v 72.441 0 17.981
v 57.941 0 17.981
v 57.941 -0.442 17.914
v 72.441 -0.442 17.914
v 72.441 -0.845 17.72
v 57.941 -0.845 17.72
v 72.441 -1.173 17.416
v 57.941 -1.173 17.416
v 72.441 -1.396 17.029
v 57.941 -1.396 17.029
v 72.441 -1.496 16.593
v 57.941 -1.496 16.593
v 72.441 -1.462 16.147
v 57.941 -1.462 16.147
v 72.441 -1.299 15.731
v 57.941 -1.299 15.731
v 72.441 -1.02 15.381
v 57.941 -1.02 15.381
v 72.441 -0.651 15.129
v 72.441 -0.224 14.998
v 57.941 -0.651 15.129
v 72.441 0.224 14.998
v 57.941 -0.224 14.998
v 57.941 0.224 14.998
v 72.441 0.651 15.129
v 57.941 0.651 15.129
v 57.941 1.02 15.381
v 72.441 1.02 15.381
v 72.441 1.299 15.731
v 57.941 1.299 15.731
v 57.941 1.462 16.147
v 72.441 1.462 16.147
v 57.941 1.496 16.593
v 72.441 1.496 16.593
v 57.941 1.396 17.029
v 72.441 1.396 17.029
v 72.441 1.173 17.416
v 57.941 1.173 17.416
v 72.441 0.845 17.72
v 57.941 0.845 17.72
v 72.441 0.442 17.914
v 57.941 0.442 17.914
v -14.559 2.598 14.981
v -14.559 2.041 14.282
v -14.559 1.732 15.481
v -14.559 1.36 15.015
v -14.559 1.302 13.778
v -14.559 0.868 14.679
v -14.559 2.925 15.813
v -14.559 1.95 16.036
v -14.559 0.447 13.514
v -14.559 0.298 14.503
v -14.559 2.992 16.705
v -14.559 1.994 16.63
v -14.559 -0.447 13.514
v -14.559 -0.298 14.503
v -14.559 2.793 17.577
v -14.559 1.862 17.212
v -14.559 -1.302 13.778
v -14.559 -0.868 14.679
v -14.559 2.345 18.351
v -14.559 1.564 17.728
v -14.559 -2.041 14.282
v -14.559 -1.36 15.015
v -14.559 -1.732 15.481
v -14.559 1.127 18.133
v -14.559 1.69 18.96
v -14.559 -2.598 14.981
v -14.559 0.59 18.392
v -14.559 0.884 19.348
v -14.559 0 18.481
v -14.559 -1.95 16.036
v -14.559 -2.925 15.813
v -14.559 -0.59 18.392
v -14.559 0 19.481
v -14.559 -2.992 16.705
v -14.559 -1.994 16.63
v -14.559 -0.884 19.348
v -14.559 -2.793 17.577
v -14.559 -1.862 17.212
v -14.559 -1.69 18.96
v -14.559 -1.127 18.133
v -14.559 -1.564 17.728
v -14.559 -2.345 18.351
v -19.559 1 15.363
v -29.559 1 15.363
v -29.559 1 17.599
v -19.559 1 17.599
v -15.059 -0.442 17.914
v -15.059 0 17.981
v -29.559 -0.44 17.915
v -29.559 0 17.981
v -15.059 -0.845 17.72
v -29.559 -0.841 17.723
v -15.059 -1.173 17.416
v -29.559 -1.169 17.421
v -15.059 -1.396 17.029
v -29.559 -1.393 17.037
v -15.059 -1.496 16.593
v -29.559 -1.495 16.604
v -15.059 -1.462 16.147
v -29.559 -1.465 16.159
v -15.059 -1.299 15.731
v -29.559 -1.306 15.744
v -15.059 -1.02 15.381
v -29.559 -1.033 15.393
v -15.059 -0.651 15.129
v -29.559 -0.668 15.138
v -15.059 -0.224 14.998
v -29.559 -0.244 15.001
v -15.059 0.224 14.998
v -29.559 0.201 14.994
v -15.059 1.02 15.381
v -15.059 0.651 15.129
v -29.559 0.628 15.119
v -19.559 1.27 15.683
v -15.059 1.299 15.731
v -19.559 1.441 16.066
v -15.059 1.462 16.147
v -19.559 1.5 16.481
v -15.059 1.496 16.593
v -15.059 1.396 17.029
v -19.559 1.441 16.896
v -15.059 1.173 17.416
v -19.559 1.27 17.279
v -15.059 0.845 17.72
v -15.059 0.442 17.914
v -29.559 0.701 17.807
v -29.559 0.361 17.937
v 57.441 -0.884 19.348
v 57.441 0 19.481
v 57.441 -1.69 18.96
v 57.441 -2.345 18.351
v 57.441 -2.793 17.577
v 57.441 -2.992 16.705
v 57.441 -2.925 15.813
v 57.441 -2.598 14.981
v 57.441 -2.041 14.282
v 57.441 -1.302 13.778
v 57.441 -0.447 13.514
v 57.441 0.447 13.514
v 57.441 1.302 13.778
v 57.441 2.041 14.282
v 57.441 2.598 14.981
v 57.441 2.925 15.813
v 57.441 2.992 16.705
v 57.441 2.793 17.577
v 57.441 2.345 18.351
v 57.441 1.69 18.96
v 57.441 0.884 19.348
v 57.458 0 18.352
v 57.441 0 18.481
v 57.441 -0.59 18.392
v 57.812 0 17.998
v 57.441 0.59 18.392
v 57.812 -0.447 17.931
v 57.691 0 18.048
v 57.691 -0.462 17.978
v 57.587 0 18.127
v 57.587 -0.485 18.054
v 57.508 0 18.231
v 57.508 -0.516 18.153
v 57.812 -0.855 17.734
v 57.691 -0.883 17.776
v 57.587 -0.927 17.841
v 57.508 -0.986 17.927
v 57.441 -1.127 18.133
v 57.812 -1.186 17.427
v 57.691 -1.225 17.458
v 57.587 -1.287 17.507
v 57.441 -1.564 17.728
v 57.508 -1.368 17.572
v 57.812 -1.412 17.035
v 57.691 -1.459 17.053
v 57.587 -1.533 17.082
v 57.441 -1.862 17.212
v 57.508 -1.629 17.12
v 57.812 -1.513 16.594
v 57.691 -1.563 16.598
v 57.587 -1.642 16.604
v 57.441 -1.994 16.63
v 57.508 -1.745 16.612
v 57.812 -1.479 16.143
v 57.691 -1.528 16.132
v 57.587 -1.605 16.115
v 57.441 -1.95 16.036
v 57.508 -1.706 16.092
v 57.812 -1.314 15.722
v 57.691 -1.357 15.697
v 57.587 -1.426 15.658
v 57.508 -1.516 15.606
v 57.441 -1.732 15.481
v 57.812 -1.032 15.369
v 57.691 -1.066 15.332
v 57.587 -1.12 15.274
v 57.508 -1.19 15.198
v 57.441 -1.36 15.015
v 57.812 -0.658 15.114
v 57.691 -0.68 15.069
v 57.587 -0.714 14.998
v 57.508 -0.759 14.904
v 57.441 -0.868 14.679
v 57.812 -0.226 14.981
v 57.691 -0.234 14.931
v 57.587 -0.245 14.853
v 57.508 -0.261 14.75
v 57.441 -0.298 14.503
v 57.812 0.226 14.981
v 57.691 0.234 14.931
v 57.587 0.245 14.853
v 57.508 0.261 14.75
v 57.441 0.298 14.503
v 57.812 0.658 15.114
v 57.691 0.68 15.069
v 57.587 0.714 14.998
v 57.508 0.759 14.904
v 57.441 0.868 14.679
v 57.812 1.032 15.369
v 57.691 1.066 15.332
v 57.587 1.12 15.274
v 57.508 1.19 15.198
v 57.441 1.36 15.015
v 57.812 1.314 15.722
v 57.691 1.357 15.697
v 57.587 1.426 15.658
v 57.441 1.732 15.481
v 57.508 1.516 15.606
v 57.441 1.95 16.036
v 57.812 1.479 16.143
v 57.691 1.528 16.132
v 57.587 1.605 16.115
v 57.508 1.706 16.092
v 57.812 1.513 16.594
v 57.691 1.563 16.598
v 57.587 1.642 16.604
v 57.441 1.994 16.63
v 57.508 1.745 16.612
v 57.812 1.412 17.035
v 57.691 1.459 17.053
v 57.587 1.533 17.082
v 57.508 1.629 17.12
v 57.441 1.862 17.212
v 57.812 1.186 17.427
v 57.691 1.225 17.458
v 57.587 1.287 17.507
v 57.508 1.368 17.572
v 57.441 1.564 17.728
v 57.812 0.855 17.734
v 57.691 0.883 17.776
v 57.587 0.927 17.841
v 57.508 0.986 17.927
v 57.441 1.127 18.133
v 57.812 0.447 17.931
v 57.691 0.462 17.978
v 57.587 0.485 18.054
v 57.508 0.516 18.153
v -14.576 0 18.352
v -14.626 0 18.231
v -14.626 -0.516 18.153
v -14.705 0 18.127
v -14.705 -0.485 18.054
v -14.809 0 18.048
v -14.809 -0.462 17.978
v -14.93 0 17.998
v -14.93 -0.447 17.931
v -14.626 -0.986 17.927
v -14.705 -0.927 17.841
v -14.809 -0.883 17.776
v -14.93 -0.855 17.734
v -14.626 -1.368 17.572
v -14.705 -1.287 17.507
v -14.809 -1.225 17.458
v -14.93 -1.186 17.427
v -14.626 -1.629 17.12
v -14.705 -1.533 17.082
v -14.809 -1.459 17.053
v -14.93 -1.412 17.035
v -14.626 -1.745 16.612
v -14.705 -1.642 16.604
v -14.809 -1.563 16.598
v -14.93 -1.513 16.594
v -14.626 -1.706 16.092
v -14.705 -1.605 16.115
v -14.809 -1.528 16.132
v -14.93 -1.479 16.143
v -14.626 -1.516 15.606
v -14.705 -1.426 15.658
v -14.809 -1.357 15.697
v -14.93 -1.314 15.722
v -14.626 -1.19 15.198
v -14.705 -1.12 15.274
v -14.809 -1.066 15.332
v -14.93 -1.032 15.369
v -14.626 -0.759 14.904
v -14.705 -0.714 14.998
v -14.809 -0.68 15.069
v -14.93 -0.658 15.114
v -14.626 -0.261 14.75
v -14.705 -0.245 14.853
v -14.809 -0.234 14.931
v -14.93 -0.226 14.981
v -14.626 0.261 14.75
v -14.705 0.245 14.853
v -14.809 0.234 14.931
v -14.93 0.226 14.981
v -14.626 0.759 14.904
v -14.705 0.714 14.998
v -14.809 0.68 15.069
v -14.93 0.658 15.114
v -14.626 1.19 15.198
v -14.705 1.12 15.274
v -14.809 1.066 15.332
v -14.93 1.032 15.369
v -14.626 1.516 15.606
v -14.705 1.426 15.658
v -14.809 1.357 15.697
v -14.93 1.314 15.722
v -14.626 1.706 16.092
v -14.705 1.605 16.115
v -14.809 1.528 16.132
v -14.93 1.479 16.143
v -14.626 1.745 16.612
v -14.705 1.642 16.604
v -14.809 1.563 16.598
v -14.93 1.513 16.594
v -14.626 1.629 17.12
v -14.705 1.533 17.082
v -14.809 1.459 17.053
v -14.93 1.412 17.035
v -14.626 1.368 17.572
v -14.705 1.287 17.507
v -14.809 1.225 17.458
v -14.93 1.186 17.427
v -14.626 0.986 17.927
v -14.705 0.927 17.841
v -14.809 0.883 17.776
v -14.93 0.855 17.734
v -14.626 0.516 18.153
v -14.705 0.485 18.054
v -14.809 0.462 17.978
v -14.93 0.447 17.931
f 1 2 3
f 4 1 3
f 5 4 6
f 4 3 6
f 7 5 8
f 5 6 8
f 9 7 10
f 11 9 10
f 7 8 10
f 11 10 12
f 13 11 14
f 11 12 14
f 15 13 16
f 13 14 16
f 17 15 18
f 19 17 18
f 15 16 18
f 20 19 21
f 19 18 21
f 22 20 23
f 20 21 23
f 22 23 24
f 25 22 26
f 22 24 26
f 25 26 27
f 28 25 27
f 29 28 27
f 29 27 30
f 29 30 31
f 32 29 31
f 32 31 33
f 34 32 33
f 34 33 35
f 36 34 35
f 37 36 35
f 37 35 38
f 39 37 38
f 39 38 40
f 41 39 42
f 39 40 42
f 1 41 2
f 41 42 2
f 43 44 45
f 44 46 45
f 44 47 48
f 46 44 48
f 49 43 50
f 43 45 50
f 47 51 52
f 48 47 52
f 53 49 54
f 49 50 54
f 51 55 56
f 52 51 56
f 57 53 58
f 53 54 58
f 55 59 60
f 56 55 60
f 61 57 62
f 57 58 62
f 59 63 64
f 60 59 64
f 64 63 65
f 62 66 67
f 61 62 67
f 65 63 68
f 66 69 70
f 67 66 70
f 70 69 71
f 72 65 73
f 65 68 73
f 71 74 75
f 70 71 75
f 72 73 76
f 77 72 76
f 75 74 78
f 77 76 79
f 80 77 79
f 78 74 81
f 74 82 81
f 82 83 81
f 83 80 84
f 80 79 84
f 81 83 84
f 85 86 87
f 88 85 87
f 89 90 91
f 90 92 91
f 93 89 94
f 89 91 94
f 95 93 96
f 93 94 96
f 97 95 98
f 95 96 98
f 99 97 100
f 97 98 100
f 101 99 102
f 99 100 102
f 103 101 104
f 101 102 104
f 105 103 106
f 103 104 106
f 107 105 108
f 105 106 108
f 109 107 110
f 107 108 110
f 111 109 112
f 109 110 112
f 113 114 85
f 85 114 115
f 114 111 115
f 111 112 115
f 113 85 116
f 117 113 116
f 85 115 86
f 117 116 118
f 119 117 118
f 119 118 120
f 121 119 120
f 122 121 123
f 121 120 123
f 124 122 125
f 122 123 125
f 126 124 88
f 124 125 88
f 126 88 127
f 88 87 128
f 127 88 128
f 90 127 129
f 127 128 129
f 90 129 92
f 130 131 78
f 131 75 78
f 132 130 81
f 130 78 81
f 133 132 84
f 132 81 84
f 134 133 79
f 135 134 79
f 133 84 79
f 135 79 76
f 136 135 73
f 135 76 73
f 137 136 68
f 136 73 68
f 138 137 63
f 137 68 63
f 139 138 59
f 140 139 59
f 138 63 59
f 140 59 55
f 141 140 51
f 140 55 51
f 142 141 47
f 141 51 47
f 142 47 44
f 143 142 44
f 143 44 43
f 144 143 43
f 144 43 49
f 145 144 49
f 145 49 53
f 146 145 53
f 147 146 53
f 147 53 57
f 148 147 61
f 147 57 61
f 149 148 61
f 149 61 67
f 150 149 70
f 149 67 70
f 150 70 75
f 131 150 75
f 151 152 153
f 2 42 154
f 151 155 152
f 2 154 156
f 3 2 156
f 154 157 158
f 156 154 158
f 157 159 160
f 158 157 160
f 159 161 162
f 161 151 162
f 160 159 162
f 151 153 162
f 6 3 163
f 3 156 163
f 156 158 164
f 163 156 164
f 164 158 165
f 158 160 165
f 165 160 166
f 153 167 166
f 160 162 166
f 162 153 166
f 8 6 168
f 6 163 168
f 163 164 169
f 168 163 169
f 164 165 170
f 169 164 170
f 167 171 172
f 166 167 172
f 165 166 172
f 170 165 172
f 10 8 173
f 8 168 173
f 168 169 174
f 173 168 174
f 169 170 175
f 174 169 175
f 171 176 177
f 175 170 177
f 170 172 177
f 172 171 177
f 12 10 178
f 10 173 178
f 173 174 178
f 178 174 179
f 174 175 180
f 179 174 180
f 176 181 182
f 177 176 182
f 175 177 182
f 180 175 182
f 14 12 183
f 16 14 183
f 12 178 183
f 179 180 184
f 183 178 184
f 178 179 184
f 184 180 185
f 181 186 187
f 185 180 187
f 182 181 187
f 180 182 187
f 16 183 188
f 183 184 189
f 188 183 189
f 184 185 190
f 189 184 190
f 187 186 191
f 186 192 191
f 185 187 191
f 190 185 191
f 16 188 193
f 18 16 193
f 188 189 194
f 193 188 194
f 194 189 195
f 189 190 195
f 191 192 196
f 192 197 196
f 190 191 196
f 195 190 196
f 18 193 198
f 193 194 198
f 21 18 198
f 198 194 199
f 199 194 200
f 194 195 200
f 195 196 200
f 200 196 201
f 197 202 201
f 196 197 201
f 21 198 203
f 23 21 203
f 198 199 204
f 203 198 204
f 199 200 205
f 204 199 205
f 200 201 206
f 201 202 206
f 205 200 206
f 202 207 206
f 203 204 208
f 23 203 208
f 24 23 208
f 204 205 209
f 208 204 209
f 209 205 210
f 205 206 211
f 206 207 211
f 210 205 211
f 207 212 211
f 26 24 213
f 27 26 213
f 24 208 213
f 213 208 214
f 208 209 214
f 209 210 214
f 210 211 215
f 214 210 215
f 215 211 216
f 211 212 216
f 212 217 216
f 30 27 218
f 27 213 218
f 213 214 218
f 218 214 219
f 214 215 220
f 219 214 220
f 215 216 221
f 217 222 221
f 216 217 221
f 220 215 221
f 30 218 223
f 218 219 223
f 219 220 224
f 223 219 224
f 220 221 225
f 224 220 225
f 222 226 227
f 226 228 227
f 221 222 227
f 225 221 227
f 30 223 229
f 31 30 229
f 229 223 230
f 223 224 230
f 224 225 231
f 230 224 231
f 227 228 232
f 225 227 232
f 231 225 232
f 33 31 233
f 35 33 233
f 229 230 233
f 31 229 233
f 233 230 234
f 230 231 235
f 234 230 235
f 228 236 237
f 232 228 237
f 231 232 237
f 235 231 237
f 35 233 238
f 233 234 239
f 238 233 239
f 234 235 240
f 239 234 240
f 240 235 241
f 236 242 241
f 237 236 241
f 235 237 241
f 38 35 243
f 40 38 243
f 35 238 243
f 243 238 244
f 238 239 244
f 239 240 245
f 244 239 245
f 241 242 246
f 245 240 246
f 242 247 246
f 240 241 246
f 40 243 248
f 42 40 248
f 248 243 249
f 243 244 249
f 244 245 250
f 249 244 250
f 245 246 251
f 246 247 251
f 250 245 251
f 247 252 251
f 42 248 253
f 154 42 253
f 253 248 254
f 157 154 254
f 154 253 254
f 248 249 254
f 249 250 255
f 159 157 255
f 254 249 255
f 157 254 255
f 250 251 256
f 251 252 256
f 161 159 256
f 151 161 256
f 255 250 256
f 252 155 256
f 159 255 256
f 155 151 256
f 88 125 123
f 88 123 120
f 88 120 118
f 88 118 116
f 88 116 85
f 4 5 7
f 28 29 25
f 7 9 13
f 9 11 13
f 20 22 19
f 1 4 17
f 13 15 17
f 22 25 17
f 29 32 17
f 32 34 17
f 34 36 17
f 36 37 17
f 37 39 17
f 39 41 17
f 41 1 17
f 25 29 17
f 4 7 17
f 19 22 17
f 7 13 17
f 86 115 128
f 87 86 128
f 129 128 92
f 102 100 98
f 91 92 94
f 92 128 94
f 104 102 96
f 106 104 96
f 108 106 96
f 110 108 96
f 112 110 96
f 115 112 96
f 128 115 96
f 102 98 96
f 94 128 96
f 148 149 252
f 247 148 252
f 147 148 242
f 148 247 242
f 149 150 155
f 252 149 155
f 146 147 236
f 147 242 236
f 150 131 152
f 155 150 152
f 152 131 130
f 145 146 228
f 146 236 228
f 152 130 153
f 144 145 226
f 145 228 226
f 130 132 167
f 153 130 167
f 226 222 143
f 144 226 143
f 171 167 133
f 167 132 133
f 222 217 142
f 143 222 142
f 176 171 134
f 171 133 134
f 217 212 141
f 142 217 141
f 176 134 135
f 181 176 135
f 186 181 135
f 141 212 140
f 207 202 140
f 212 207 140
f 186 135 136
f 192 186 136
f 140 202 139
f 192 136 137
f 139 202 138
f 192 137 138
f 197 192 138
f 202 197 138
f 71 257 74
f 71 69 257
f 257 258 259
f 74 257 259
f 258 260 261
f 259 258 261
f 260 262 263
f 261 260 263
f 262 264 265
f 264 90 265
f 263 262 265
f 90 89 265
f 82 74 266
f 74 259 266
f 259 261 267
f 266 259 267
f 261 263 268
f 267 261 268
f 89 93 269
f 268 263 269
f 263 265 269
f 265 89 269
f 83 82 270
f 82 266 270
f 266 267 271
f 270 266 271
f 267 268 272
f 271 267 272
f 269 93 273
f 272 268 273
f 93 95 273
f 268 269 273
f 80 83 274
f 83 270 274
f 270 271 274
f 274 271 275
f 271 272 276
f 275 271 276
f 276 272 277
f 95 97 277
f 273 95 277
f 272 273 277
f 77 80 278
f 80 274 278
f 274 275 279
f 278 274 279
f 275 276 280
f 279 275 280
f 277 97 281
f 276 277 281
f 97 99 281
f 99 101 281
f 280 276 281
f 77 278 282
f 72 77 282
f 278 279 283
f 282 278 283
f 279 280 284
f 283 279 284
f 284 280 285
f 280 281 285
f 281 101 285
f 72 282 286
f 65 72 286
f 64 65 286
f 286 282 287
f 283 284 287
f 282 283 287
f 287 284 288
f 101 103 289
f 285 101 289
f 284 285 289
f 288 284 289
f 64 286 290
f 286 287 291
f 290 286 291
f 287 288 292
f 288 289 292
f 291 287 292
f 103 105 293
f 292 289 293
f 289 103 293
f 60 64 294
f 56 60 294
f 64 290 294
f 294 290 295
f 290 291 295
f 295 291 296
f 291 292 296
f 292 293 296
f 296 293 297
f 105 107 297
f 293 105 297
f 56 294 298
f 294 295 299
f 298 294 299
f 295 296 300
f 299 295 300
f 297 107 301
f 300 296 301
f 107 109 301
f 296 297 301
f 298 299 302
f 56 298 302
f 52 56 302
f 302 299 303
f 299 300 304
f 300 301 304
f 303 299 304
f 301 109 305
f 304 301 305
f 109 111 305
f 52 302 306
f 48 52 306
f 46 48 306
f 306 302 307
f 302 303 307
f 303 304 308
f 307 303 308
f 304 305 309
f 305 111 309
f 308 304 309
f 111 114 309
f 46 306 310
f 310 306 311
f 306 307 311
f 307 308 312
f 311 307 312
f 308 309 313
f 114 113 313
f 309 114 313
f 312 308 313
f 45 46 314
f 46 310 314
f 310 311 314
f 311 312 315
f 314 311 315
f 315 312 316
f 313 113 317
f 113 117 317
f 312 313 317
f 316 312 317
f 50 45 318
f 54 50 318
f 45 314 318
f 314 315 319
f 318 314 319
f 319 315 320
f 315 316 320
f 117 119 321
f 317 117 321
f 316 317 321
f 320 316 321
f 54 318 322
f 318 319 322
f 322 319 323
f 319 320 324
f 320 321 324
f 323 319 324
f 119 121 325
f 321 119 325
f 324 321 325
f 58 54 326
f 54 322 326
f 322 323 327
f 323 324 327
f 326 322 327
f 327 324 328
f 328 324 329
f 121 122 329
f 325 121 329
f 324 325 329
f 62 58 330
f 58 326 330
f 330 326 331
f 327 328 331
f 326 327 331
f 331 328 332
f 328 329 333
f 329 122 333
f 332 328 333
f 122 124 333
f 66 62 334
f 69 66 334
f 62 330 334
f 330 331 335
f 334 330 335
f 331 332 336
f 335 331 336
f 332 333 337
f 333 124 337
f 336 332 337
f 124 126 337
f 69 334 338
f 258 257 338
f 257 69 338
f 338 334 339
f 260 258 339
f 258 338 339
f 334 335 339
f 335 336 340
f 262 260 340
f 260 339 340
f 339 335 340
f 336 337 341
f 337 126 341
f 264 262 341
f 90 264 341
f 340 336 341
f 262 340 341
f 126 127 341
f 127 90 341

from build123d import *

# Parameters (mm, degrees)
FILLET1_R          = 0.5
CUT_EXTRUDE1_DEPTH = 10


with BuildPart() as part:
    # Sketch1 → Revolve1 (revolve)
    with BuildSketch(Plane(origin=(0, 0, 0), x_dir=(1, 0, 0), z_dir=(0, 1, 0)), mode=Mode.PRIVATE) as revolve1_sk:
        Polygon((-29.558969675, -16.48093475), (72.441030325, -16.48093475), (72.441030325, -14.98093475), (57.441030325, -14.98093475), (57.441030325, -13.48093475), (-14.558969675, -13.48093475), (-14.558969675, -14.98093475), (-29.558969675, -14.98093475), align=None)
    revolve(revolve1_sk.sketch.rotate(Axis((-29.558969675, 0, 16.48093475), (1, 0, 0)), 180), axis=Axis((-29.558969675, 0, 16.48093475), (1, 0, 0)))

    # Fillet1
    fillet1_edges = [part.edges().sort_by_distance(p)[0] for p in [
        (57.441030325, 0, 14.98093475),
        (-14.558969675, 0, 14.98093475),
    ]]
    fillet(fillet1_edges, radius=FILLET1_R)

    # Sketch2 → Cut-Extrude1 (cut)
    with BuildSketch(Plane.ZY.offset(29.558969675)):
        with BuildLine():
            Line((15.362900761, 1), (17.598968739, 1))
            ThreePointArc((17.598968739, 1), (16.48093475, 1.5), (15.362900761, 1))
        make_face()
    extrude(amount=-CUT_EXTRUDE1_DEPTH, mode=Mode.SUBTRACT)


solid = part.part
